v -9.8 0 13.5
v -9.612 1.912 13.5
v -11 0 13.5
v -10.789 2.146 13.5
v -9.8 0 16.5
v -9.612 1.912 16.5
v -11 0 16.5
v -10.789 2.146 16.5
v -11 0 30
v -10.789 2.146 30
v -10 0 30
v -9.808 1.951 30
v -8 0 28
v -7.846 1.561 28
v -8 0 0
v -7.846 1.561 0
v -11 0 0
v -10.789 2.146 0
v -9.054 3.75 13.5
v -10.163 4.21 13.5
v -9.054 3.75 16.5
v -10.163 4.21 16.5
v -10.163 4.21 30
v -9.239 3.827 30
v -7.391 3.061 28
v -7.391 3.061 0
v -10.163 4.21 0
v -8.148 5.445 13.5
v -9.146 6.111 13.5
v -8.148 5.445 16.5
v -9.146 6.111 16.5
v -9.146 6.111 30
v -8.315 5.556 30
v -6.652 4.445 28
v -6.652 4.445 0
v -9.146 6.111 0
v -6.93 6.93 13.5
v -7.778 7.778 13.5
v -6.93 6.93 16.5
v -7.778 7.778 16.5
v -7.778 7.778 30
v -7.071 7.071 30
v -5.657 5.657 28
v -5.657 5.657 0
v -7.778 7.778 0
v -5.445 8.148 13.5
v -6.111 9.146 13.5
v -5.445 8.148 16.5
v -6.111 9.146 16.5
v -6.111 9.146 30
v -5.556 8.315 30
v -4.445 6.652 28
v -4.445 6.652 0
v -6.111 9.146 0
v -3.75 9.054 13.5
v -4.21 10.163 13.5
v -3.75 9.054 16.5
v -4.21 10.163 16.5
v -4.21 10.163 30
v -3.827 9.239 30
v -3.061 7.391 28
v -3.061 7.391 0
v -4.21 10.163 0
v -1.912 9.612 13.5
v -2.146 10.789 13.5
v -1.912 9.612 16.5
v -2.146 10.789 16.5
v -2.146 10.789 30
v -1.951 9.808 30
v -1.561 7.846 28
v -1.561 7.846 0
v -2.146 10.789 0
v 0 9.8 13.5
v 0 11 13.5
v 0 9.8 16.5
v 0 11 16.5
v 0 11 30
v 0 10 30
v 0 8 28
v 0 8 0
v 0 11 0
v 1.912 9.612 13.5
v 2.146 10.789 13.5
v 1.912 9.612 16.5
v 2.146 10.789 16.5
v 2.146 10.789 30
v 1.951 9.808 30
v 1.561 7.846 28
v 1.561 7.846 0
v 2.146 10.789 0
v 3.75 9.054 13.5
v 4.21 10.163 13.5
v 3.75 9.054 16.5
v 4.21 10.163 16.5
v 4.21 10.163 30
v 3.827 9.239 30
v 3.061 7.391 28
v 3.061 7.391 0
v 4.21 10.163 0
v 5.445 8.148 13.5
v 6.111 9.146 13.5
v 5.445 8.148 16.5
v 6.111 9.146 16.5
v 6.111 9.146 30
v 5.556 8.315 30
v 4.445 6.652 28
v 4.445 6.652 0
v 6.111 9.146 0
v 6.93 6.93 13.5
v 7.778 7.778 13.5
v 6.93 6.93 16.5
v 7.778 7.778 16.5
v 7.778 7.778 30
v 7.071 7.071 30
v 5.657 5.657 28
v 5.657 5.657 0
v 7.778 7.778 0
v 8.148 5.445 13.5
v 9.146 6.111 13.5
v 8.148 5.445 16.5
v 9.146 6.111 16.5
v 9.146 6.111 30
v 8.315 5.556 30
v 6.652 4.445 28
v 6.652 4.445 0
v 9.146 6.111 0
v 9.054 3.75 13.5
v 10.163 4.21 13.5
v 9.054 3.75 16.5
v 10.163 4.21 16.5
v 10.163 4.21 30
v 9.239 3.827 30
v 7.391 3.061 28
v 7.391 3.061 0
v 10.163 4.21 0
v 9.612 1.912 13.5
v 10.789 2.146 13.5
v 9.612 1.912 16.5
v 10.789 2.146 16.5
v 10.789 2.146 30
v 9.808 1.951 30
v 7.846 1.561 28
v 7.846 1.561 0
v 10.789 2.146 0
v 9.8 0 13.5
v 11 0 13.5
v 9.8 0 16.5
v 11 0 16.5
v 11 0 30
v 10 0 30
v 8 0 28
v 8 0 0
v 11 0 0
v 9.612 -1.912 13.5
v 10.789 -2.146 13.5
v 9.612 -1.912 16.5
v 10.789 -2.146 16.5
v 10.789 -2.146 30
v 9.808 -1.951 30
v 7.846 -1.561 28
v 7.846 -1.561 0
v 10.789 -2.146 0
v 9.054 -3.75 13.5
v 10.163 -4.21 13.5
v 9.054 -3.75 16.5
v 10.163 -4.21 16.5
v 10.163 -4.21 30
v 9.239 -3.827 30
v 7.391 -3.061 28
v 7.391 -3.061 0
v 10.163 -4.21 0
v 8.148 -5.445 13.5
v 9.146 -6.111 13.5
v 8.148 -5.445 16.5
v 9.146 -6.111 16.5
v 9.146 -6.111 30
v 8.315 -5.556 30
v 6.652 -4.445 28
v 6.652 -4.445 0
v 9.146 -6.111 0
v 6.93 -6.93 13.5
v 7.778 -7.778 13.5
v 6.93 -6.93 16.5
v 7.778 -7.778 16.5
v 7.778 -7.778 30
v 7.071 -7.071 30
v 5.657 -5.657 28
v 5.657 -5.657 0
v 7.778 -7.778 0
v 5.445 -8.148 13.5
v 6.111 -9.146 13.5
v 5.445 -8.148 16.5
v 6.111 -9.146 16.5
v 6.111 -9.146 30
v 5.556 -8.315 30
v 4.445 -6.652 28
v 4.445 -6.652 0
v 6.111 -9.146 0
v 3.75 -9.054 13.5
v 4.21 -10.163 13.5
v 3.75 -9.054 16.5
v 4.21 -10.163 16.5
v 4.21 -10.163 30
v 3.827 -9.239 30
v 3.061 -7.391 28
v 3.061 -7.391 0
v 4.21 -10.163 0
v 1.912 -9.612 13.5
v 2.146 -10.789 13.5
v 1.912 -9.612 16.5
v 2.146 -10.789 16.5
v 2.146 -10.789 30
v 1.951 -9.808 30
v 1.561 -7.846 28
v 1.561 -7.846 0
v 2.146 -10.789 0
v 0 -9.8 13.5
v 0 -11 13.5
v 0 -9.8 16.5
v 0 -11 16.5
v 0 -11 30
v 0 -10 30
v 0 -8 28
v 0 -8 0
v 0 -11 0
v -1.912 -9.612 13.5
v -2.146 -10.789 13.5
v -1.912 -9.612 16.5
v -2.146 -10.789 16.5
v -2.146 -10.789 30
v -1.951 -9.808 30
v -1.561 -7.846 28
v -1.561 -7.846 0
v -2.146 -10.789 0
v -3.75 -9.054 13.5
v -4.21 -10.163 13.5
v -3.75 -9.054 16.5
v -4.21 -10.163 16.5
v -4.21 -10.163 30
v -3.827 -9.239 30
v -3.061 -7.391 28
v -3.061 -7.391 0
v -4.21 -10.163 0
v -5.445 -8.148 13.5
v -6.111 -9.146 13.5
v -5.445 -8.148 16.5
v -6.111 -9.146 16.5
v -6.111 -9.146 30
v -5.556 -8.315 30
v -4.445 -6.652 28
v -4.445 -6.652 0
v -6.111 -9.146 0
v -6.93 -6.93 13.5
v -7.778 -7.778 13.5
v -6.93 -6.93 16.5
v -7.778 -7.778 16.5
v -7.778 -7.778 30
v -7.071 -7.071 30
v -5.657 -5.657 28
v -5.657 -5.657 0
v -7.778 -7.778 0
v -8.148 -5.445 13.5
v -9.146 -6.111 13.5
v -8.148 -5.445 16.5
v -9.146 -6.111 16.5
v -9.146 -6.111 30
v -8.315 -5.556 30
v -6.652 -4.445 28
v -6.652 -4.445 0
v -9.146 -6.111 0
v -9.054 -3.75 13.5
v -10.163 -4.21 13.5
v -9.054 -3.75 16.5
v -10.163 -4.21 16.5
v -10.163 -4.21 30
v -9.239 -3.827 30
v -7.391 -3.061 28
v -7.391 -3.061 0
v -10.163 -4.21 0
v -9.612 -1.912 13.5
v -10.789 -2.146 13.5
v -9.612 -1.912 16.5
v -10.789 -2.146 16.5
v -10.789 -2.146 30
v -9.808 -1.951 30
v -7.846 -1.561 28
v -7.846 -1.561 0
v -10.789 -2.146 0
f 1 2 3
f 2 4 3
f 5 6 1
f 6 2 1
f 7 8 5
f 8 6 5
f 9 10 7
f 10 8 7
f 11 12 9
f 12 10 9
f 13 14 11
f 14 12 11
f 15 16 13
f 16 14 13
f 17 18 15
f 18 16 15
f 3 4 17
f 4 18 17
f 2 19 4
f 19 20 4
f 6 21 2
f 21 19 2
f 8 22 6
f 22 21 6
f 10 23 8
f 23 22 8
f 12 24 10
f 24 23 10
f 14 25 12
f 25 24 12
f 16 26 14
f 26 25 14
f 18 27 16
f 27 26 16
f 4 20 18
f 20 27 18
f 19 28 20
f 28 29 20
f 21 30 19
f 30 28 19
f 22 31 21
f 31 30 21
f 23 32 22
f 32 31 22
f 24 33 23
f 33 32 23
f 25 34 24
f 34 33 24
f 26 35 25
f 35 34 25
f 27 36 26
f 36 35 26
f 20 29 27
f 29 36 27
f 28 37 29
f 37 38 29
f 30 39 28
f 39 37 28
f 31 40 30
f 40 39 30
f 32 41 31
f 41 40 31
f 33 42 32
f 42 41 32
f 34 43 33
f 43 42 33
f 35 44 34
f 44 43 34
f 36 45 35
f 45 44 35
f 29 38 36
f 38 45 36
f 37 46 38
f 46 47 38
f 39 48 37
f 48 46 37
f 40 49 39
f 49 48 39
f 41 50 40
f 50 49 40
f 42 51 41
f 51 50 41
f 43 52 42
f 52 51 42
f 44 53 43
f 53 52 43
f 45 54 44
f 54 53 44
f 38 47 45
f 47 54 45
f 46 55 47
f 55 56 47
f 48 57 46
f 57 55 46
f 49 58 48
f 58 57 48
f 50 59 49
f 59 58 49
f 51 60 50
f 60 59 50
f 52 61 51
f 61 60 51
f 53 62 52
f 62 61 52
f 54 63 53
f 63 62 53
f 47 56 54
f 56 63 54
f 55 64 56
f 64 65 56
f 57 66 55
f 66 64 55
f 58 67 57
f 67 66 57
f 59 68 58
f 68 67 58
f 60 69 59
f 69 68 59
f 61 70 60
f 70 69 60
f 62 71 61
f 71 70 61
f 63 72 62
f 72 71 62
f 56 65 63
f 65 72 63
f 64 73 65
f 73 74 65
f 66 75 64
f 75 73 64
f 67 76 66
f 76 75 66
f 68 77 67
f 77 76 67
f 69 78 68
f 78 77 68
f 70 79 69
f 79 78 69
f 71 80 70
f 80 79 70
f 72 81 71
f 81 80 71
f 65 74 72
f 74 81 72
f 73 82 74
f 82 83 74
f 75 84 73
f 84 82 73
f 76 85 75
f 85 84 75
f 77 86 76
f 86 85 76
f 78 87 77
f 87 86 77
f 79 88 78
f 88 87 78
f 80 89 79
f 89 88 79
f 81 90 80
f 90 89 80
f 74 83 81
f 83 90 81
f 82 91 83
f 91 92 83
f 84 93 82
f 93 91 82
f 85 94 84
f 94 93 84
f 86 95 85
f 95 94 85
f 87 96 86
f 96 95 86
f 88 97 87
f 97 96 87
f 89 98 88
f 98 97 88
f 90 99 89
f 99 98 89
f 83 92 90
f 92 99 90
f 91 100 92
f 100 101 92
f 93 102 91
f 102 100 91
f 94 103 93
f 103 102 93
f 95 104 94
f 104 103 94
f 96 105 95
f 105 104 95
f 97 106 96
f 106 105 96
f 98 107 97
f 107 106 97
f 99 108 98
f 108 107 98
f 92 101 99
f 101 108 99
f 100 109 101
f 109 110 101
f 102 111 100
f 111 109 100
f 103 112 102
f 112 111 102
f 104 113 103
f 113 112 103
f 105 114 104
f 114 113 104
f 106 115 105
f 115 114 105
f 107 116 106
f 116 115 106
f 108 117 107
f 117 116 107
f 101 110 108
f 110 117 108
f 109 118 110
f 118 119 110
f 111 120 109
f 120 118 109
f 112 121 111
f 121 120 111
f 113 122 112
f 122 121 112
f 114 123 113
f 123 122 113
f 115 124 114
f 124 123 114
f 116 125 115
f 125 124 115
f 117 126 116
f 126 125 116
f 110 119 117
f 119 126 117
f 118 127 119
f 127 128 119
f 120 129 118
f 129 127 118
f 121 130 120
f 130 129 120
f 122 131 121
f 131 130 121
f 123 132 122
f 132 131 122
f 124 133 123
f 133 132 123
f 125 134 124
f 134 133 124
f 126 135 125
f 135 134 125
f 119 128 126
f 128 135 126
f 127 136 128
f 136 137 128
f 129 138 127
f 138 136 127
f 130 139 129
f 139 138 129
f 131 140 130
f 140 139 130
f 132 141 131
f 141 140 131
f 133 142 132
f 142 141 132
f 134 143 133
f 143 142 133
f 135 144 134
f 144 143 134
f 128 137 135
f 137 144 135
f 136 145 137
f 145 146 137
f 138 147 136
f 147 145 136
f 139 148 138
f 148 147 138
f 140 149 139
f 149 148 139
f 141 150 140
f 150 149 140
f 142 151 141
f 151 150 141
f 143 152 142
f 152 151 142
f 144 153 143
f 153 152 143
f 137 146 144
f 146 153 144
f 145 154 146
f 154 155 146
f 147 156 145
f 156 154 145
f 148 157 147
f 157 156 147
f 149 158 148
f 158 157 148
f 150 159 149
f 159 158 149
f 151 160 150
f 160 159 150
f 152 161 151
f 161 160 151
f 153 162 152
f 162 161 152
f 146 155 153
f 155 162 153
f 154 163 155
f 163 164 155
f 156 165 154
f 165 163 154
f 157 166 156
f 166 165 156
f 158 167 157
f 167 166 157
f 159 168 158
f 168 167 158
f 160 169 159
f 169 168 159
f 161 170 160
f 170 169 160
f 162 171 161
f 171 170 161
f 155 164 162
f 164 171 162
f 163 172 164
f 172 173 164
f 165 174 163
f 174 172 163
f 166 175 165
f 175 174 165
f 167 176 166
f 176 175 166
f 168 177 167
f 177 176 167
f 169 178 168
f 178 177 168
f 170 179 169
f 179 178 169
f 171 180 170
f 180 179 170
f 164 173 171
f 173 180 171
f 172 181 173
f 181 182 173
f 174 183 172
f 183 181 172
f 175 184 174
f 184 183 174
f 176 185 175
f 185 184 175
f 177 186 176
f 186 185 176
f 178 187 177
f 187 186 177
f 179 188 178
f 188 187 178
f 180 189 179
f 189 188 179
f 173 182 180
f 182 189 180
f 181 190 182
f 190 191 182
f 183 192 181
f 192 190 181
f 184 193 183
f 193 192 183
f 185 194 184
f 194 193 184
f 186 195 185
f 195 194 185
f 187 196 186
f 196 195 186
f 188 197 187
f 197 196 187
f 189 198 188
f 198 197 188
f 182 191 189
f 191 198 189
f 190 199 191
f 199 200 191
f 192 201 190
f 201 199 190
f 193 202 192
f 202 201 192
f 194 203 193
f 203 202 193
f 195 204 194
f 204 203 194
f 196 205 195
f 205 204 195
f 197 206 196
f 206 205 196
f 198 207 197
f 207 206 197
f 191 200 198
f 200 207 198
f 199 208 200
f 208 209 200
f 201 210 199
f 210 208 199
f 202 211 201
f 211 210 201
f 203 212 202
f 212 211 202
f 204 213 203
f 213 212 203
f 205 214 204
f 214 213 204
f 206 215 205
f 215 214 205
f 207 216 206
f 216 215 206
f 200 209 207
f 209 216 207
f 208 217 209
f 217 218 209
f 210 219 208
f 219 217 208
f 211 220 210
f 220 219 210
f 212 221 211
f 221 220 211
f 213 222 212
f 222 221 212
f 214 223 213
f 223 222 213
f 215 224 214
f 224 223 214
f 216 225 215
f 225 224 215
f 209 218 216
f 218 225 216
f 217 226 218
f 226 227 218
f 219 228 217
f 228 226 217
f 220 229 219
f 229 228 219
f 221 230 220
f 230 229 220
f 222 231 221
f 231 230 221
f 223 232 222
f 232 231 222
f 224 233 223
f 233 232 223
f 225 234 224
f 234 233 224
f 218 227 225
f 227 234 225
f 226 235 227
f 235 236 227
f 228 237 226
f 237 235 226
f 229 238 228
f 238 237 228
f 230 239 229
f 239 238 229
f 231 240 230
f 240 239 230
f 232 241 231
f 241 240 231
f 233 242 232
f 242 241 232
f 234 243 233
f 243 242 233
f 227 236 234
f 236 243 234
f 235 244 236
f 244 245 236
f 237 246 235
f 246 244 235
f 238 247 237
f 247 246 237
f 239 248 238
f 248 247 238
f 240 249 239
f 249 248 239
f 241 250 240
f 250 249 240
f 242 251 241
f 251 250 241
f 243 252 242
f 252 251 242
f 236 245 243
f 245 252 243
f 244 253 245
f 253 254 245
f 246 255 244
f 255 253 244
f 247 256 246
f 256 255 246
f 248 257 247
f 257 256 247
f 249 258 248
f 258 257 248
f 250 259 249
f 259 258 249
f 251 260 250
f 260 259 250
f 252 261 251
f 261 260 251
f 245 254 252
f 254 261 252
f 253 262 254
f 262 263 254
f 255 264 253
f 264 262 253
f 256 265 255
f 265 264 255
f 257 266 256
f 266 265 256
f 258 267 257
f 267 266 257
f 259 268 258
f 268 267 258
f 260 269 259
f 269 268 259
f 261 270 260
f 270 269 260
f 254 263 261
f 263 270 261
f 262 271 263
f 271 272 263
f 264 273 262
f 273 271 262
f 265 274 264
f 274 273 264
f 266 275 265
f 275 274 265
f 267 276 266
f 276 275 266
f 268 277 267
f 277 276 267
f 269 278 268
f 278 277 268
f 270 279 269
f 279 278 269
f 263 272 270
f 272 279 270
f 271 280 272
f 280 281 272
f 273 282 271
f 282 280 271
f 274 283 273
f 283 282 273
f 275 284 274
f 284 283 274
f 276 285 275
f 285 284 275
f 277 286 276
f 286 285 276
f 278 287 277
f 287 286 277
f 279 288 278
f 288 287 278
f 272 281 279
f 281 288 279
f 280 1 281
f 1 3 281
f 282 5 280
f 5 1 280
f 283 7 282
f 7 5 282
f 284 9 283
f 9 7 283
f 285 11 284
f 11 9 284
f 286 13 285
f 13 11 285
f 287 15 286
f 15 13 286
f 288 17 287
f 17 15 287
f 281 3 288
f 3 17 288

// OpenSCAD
$fn = 32;

// ----------------------------------------------------------------------
// Grooved revolve: thread_relief, bore R8
// ----------------------------------------------------------------------

// --- parameters (mm) ---
bore_r = 8;               // bore radius
outer_r = 11;             // outer radius of the body
total_h = 30;             // overall height, Z
wall = 3;                 // radial wall thickness
groove_w = 3;             // groove width
groove_d = 1.2;           // groove depth
grooves = 1;              // number of outer grooves
relief = 2;               // thread relief leg at the bore mouth
relief_angle = 45;        // thread relief chamfer angle, degrees

bbox_x = 2 * outer_r;  // full diameter
bore_d = 2 * bore_r;  // bore diameter
body_d = 2 * outer_r;  // body diameter
revolve_angle = 360;  // full turn around the Z axis

profile = [[8, 0], [11, 0], [11, 13.5], [9.8, 13.5], [9.8, 16.5], [11, 16.5], [11, 30], [10, 30], [8, 28]];  // primary outline, 9 points, counter clockwise

// --- the one profile operation ---
rotate_extrude(angle = revolve_angle) polygon(points = profile);
